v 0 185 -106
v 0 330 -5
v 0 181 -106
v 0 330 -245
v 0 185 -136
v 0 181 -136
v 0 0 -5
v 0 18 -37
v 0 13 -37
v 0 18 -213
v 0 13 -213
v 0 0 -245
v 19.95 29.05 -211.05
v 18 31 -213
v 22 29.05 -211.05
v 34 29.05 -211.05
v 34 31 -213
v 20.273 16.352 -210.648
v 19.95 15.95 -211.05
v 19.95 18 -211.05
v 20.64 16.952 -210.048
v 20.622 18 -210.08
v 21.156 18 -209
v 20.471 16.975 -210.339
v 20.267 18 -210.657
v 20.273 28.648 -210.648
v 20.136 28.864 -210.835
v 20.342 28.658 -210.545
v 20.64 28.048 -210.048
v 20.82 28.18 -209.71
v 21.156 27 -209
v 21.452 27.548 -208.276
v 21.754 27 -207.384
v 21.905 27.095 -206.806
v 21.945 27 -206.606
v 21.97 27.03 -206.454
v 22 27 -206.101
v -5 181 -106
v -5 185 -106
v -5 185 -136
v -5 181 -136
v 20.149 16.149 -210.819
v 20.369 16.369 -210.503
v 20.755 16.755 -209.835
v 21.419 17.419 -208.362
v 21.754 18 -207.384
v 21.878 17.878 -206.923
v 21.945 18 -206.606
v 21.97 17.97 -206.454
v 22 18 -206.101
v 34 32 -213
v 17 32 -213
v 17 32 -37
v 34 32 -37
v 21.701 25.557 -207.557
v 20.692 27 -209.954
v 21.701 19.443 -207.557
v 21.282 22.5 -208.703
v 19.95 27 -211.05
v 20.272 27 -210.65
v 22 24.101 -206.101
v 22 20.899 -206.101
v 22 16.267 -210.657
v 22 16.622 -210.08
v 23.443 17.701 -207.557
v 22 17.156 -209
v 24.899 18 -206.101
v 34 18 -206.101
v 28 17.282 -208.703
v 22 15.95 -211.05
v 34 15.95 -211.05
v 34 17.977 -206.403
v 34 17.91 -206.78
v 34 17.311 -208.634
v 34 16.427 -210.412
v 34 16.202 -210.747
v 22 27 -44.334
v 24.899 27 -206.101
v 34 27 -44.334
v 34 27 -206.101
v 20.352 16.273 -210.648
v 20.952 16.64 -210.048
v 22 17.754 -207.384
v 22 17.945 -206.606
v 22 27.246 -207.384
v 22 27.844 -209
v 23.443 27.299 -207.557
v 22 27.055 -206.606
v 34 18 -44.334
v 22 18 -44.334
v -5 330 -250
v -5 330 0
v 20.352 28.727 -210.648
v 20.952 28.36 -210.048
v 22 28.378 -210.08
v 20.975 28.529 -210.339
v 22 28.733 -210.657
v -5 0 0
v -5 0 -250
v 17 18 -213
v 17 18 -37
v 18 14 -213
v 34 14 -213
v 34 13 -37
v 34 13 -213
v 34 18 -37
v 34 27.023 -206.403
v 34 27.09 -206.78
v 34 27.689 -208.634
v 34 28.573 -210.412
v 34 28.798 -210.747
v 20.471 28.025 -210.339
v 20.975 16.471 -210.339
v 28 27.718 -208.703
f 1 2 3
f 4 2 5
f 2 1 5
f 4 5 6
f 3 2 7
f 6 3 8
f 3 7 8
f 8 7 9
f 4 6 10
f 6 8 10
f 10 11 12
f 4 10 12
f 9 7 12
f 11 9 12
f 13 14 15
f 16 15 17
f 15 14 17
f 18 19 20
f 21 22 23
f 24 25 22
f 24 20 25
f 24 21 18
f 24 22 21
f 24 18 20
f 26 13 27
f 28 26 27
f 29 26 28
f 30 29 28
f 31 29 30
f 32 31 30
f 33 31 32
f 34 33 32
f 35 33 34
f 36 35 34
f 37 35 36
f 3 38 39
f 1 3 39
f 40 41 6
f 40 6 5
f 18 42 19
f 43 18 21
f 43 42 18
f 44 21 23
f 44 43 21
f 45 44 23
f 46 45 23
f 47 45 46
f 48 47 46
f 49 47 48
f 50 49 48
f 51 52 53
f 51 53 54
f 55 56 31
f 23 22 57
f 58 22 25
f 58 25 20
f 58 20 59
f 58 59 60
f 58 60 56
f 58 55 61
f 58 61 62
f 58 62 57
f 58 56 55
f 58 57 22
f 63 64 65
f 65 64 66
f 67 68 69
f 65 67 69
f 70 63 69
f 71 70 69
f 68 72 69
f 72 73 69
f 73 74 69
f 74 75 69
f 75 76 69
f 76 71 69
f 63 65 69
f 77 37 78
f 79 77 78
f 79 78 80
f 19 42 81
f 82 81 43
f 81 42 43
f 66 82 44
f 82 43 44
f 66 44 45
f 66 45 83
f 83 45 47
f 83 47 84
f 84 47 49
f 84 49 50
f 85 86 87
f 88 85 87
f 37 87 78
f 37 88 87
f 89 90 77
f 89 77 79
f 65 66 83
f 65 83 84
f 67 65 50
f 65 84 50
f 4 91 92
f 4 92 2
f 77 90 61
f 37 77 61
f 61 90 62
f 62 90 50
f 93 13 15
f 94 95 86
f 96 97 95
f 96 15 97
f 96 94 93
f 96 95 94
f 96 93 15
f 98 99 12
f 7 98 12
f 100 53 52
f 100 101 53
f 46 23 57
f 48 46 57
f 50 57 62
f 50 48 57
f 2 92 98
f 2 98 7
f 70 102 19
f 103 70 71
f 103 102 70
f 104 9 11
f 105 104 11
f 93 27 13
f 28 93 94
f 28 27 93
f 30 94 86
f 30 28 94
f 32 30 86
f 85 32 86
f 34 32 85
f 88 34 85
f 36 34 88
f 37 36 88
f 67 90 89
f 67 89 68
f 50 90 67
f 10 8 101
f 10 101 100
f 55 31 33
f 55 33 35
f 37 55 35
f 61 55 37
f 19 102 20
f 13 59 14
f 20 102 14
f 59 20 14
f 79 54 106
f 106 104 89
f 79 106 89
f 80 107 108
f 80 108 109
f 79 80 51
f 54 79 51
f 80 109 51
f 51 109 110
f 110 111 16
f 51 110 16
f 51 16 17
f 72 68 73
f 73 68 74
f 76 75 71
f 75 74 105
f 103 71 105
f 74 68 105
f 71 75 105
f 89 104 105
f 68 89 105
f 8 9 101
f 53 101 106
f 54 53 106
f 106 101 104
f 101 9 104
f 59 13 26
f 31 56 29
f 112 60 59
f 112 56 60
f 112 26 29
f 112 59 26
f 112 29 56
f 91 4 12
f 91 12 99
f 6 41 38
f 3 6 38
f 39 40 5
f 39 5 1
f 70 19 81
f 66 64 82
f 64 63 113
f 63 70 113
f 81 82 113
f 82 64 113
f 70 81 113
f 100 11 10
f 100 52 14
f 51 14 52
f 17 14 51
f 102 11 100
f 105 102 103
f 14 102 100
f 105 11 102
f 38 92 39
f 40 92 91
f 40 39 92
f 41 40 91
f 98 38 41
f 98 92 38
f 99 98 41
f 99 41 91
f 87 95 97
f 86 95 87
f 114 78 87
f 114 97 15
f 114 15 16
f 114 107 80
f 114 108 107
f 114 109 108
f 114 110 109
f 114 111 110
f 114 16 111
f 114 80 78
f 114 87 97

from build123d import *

# Parameters (mm, degrees)
CROQUIS1_W              = 5
CROQUIS1_H              = 250
SALIENTE_EXTRUIR1_DEPTH = 330
CORTAR_EXTRUIR1_REACH   = 416.035
CROQUIS3_W              = 176
CROQUIS3_H              = 5
SALIENTE_EXTRUIR2_DEPTH = 34
CROQUIS4_W              = 5
CROQUIS4_H              = 176
SALIENTE_EXTRUIR3_DEPTH = 9
CROQUIS5_W              = 17
CROQUIS5_H              = 176
SALIENTE_EXTRUIR4_DEPTH = 5
REDONDEO1_SIZE          = 4
CROQUIS6_W              = 12
CROQUIS6_H              = 7.334173777
SALIENTE_EXTRUIR5_DEPTH = 9
CORTAR_EXTRUIR2_REACH   = 417.838
CROQUIS7_W              = 30
CROQUIS7_H              = 4


with BuildPart() as part:
    # Croquis1 → Saliente-Extruir1 (new body)
    with BuildSketch(Plane(origin=(0, 0, 0), x_dir=(1, 0, 0), z_dir=(0, 1, 0))):
        with Locations((-2.5, 125)):
            Rectangle(CROQUIS1_W, CROQUIS1_H)
    extrude(amount=SALIENTE_EXTRUIR1_DEPTH)

    # Croquis2 → Cortar-Extruir1 (cut, up to next)
    with BuildSketch(Plane(origin=(0, 330, 0), x_dir=(1, 0, 0), z_dir=(0, 1, 0)), mode=Mode.PRIVATE) as cortar_extruir1_sk1:
        Polygon((0, 250), (0, 245), (-5, 250), align=None)
    cortar_extruir1_tool1 = extrude(cortar_extruir1_sk1.sketch, amount=-CORTAR_EXTRUIR1_REACH, mode=Mode.PRIVATE) & part.part
    # Croquis2 → Cortar-Extruir1 (cut, up to next)
    with BuildSketch(Plane(origin=(0, 330, 0), x_dir=(1, 0, 0), z_dir=(0, 1, 0)), mode=Mode.PRIVATE) as cortar_extruir1_sk2:
        Polygon((-5, 0), (0, 5), (0, 0), align=None)
    cortar_extruir1_tool2 = extrude(cortar_extruir1_sk2.sketch, amount=-CORTAR_EXTRUIR1_REACH, mode=Mode.PRIVATE) & part.part
    add(cortar_extruir1_tool1.solids().sort_by_distance((-1.666667, 330, -248.333333))[0], mode=Mode.SUBTRACT)
    add(cortar_extruir1_tool2.solids().sort_by_distance((-1.666667, 330, -1.666667))[0], mode=Mode.SUBTRACT)

    # Croquis3 → Saliente-Extruir2 (add)
    with BuildSketch(Plane(origin=(0, 0, 0), x_dir=(0, 0, -1), z_dir=(1, 0, 0))):
        with Locations((125, 15.5)):
            Rectangle(CROQUIS3_W, CROQUIS3_H)
    extrude(amount=SALIENTE_EXTRUIR2_DEPTH)

    # Croquis4 → Saliente-Extruir3 (add)
    with BuildSketch(Plane(origin=(0, 18, 0), x_dir=(1, 0, 0), z_dir=(0, 1, 0))):
        with Locations((19.5, 125)):
            Rectangle(CROQUIS4_W, CROQUIS4_H)
    extrude(amount=SALIENTE_EXTRUIR3_DEPTH)

    # Croquis5 → Saliente-Extruir4 (add)
    with BuildSketch(Plane(origin=(0, 27, 0), x_dir=(1, 0, 0), z_dir=(0, 1, 0))):
        with Locations((25.5, 125)):
            Rectangle(CROQUIS5_W, CROQUIS5_H)
    extrude(amount=SALIENTE_EXTRUIR4_DEPTH)

    # Redondeo1
    redondeo1_edges = [part.edges().sort_by_distance(p)[0] for p in [
        (28, 18, -213),
        (22, 22.5, -213),
        (28, 27, -213),
    ]]
    chamfer(redondeo1_edges, length=REDONDEO1_SIZE)

    # Redondeo2
    # a fillet whose section is not a circle: 7 mm, written as the material it takes off along each edge
    with BuildSketch(Plane(origin=(22, 27, -209), x_dir=(0, 0.7071067811865493, -0.7071067811865457), z_dir=(1, 0, 0))) as redondeo2_piece_1_section:
        with BuildLine():
            Bezier((2.899494937, 0), (0, 0), (-2.050252532, 2.050252532), weights=[1, 0.428571429, 1])
            Line((-2.050252532, 2.050252532), (0, 0))
            Line((0, 0), (2.899494937, 0))
        make_face()
    redondeo2_piece_1 = extrude(amount=19.248737342, mode=Mode.PRIVATE)
    redondeo2_piece_1 = split(redondeo2_piece_1, bisect_by=Plane(origin=(22, 27, -209), z_dir=(-0.7071067811865476, 0, 0.7071067811865476)), keep=Keep.TOP, mode=Mode.PRIVATE)
    add(redondeo2_piece_1, mode=Mode.SUBTRACT)
    with BuildSketch(Plane(origin=(14.751262658, 27, -209), x_dir=(0, 0.7071067811865493, -0.7071067811865457), z_dir=(1, 0, 0))) as redondeo2_piece_2_section:
        with BuildLine():
            Bezier((2.899494937, 0), (0, 0), (-2.050252532, 2.050252532), weights=[1, 0.428571429, 1])
            Line((-2.050252532, 2.050252532), (0, 0))
            Line((0, 0), (2.899494937, 0))
        make_face()
    redondeo2_piece_2 = extrude(amount=26.497474683, mode=Mode.PRIVATE)
    redondeo2_piece_2 = split(redondeo2_piece_2, bisect_by=Plane(origin=(18.375631329, 27, -212.624368671), z_dir=(0.7071067811865476, 0, -0.7071067811865476)), keep=Keep.TOP, mode=Mode.PRIVATE)
    redondeo2_piece_2 = split(redondeo2_piece_2, bisect_by=Plane(origin=(22, 27, -209), z_dir=(-1, 0, 0)), keep=Keep.TOP, mode=Mode.PRIVATE)
    add(redondeo2_piece_2, mode=Mode.SUBTRACT)
    with BuildSketch(Plane(origin=(22, 27, -209), x_dir=(0, 0.7071067811865493, -0.7071067811865457), z_dir=(1, 0, 0))) as redondeo2_piece_3_section:
        with BuildLine():
            Bezier((2.899494937, 0), (0, 0), (-2.050252532, 2.050252532), weights=[1, 0.428571429, 1])
            Line((-2.050252532, 2.050252532), (0, 0))
            Line((0, 0), (2.899494937, 0))
        make_face()
    redondeo2_piece_3 = extrude(amount=19.248737342, mode=Mode.PRIVATE)
    redondeo2_piece_3 = split(redondeo2_piece_3, bisect_by=Plane(origin=(22, 27, -209), z_dir=(0.7071067811865476, 0, -0.7071067811865476)), keep=Keep.TOP, mode=Mode.PRIVATE)
    add(redondeo2_piece_3, mode=Mode.SUBTRACT)
    with BuildSketch(Plane(origin=(22, 18, -209), x_dir=(-0.7071067811865493, 0, -0.7071067811865457), z_dir=(0, 1, 0))) as redondeo2_piece_4_section:
        with BuildLine():
            Bezier((2.899494937, 0), (0, 0), (-2.050252532, 2.050252532), weights=[1, 0.428571429, 1])
            Line((-2.050252532, 2.050252532), (0, 0))
            Line((0, 0), (2.899494937, 0))
        make_face()
    redondeo2_piece_4 = extrude(amount=9, mode=Mode.PRIVATE)
    redondeo2_piece_4 = split(redondeo2_piece_4, bisect_by=Plane(origin=(22, 18, -209), z_dir=(0, -0.7071067811865476, 0.7071067811865476)), keep=Keep.TOP, mode=Mode.PRIVATE)
    add(redondeo2_piece_4, mode=Mode.SUBTRACT)
    with BuildSketch(Plane(origin=(22, 10.751262658, -209), x_dir=(-0.7071067811865493, 0, -0.7071067811865457), z_dir=(0, 1, 0))) as redondeo2_piece_5_section:
        with BuildLine():
            Bezier((2.899494937, 0), (0, 0), (-2.050252532, 2.050252532), weights=[1, 0.428571429, 1])
            Line((-2.050252532, 2.050252532), (0, 0))
            Line((0, 0), (2.899494937, 0))
        make_face()
    redondeo2_piece_5 = extrude(amount=16.248737342, mode=Mode.PRIVATE)
    redondeo2_piece_5 = split(redondeo2_piece_5, bisect_by=Plane(origin=(22, 14.375631329, -212.624368671), z_dir=(0, 0.7071067811865476, -0.7071067811865476)), keep=Keep.TOP, mode=Mode.PRIVATE)
    redondeo2_piece_5 = split(redondeo2_piece_5, bisect_by=Plane(origin=(22, 18, -209), z_dir=(0, -1, 0)), keep=Keep.TOP, mode=Mode.PRIVATE)
    add(redondeo2_piece_5, mode=Mode.SUBTRACT)
    with BuildSketch(Plane(origin=(22, 18, -209), x_dir=(-0.7071067811865493, 0, -0.7071067811865457), z_dir=(0, 1, 0))) as redondeo2_piece_6_section:
        with BuildLine():
            Bezier((2.899494937, 0), (0, 0), (-2.050252532, 2.050252532), weights=[1, 0.428571429, 1])
            Line((-2.050252532, 2.050252532), (0, 0))
            Line((0, 0), (2.899494937, 0))
        make_face()
    redondeo2_piece_6 = extrude(amount=9, mode=Mode.PRIVATE)
    redondeo2_piece_6 = split(redondeo2_piece_6, bisect_by=Plane(origin=(22, 18, -209), z_dir=(0, 0.7071067811865476, -0.7071067811865476)), keep=Keep.TOP, mode=Mode.PRIVATE)
    redondeo2_piece_6 = split(redondeo2_piece_6, bisect_by=Plane(origin=(22, 22.5, -204.5), z_dir=(0, -0.7071067811865476, -0.7071067811865476)), keep=Keep.TOP, mode=Mode.PRIVATE)
    add(redondeo2_piece_6, mode=Mode.SUBTRACT)
    with BuildSketch(Plane(origin=(22, 18, -209), x_dir=(-0.7071067811865493, 0, -0.7071067811865457), z_dir=(0, 1, 0))) as redondeo2_piece_7_section:
        with BuildLine():
            Bezier((2.899494937, 0), (0, 0), (-2.050252532, 2.050252532), weights=[1, 0.428571429, 1])
            Line((-2.050252532, 2.050252532), (0, 0))
            Line((0, 0), (2.899494937, 0))
        make_face()
    redondeo2_piece_7 = extrude(amount=9, mode=Mode.PRIVATE)
    redondeo2_piece_7 = split(redondeo2_piece_7, bisect_by=Plane(origin=(22, 22.5, -204.5), z_dir=(0, 0.7071067811865476, 0.7071067811865476)), keep=Keep.TOP, mode=Mode.PRIVATE)
    add(redondeo2_piece_7, mode=Mode.SUBTRACT)
    with BuildSketch(Plane(origin=(22, 18, -209), x_dir=(-0.7071067811865493, 0, -0.7071067811865457), z_dir=(0, 1, 0))) as redondeo2_piece_8_section:
        with BuildLine():
            Bezier((2.899494937, 0), (0, 0), (-2.050252532, 2.050252532), weights=[1, 0.428571429, 1])
            Line((-2.050252532, 2.050252532), (0, 0))
            Line((0, 0), (2.899494937, 0))
        make_face()
    redondeo2_piece_8 = extrude(amount=16.248737342, mode=Mode.PRIVATE)
    redondeo2_piece_8 = split(redondeo2_piece_8, bisect_by=Plane(origin=(22, 22.5, -204.5), z_dir=(0, -0.7071067811865476, -0.7071067811865476)), keep=Keep.TOP, mode=Mode.PRIVATE)
    redondeo2_piece_8 = split(redondeo2_piece_8, bisect_by=Plane(origin=(22, 27, -209), z_dir=(0, 1, 0)), keep=Keep.TOP, mode=Mode.PRIVATE)
    add(redondeo2_piece_8, mode=Mode.SUBTRACT)
    with BuildSketch(Plane(origin=(22, 18, -209), x_dir=(0, -0.7071067811865497, -0.7071067811865454), z_dir=(1, 0, 0))) as redondeo2_piece_9_section:
        with BuildLine():
            Bezier((2.899494937, 0), (0, 0), (-2.050252532, -2.050252532), weights=[1, 0.428571429, 1])
            Line((-2.050252532, -2.050252532), (0, 0))
            Line((0, 0), (2.899494937, 0))
        make_face()
    redondeo2_piece_9 = extrude(amount=19.248737342, mode=Mode.PRIVATE)
    redondeo2_piece_9 = split(redondeo2_piece_9, bisect_by=Plane(origin=(22, 18, -209), z_dir=(-0.7071067811865476, 0, 0.7071067811865476)), keep=Keep.TOP, mode=Mode.PRIVATE)
    add(redondeo2_piece_9, mode=Mode.SUBTRACT)
    with BuildSketch(Plane(origin=(14.751262658, 18, -209), x_dir=(0, -0.7071067811865497, -0.7071067811865454), z_dir=(1, 0, 0))) as redondeo2_piece_10_section:
        with BuildLine():
            Bezier((2.899494937, 0), (0, 0), (-2.050252532, -2.050252532), weights=[1, 0.428571429, 1])
            Line((-2.050252532, -2.050252532), (0, 0))
            Line((0, 0), (2.899494937, 0))
        make_face()
    redondeo2_piece_10 = extrude(amount=26.497474683, mode=Mode.PRIVATE)
    redondeo2_piece_10 = split(redondeo2_piece_10, bisect_by=Plane(origin=(18.375631329, 18, -212.624368671), z_dir=(0.7071067811865476, 0, -0.7071067811865476)), keep=Keep.TOP, mode=Mode.PRIVATE)
    redondeo2_piece_10 = split(redondeo2_piece_10, bisect_by=Plane(origin=(22, 18, -209), z_dir=(-1, 0, 0)), keep=Keep.TOP, mode=Mode.PRIVATE)
    add(redondeo2_piece_10, mode=Mode.SUBTRACT)
    with BuildSketch(Plane(origin=(22, 18, -209), x_dir=(0, -0.7071067811865497, -0.7071067811865454), z_dir=(1, 0, 0))) as redondeo2_piece_11_section:
        with BuildLine():
            Bezier((2.899494937, 0), (0, 0), (-2.050252532, -2.050252532), weights=[1, 0.428571429, 1])
            Line((-2.050252532, -2.050252532), (0, 0))
            Line((0, 0), (2.899494937, 0))
        make_face()
    redondeo2_piece_11 = extrude(amount=19.248737342, mode=Mode.PRIVATE)
    redondeo2_piece_11 = split(redondeo2_piece_11, bisect_by=Plane(origin=(22, 18, -209), z_dir=(0.7071067811865476, 0, -0.7071067811865476)), keep=Keep.TOP, mode=Mode.PRIVATE)
    add(redondeo2_piece_11, mode=Mode.SUBTRACT)
    with BuildSketch(Plane(origin=(22, 18, -209), x_dir=(-0.7071067811865493, 0, -0.7071067811865457), z_dir=(0, 1, 0))) as redondeo2_piece_12a_section:
        with BuildLine():
            Bezier((2.899494937, 0), (0, 0), (-2.050252532, 2.050252532), weights=[1, 0.428571429, 1])
            Line((-2.050252532, 2.050252532), (0, 0))
            Line((0, 0), (2.899494937, 0))
        make_face()
    redondeo2_piece_12a = extrude(amount=16.248737342, mode=Mode.PRIVATE)
    redondeo2_piece_12a = split(redondeo2_piece_12a, bisect_by=Plane(origin=(22, 22.5, -204.5), z_dir=(0, 0.7071067811865476, 0.7071067811865476)), keep=Keep.TOP, mode=Mode.PRIVATE)
    redondeo2_piece_12a = split(redondeo2_piece_12a, bisect_by=Plane(origin=(22, 27, -209), z_dir=(0, 1, 0)), keep=Keep.TOP, mode=Mode.PRIVATE)
    with BuildSketch(Plane(origin=(14.751262658, 27, -209), x_dir=(0, 0.7071067811865493, -0.7071067811865457), z_dir=(1, 0, 0))) as redondeo2_piece_12b_section:
        with BuildLine():
            Bezier((2.899494937, 0), (0, 0), (-2.050252532, 2.050252532), weights=[1, 0.428571429, 1])
            Line((-2.050252532, 2.050252532), (0, 0))
            Line((0, 0), (2.899494937, 0))
        make_face()
    redondeo2_piece_12b = extrude(amount=26.497474683, mode=Mode.PRIVATE)
    redondeo2_piece_12b = split(redondeo2_piece_12b, bisect_by=Plane(origin=(18.375631329, 27, -212.624368671), z_dir=(-0.7071067811865476, 0, 0.7071067811865476)), keep=Keep.TOP, mode=Mode.PRIVATE)
    redondeo2_piece_12b = split(redondeo2_piece_12b, bisect_by=Plane(origin=(22, 27, -209), z_dir=(-1, 0, 0)), keep=Keep.TOP, mode=Mode.PRIVATE)
    redondeo2_piece_12 = redondeo2_piece_12a & redondeo2_piece_12b
    add(redondeo2_piece_12, mode=Mode.SUBTRACT)
    with BuildSketch(Plane(origin=(14.751262658, 18, -209), x_dir=(0, -0.7071067811865497, -0.7071067811865454), z_dir=(1, 0, 0))) as redondeo2_piece_13a_section:
        with BuildLine():
            Bezier((2.899494937, 0), (0, 0), (-2.050252532, -2.050252532), weights=[1, 0.428571429, 1])
            Line((-2.050252532, -2.050252532), (0, 0))
            Line((0, 0), (2.899494937, 0))
        make_face()
    redondeo2_piece_13a = extrude(amount=26.497474683, mode=Mode.PRIVATE)
    redondeo2_piece_13a = split(redondeo2_piece_13a, bisect_by=Plane(origin=(18.375631329, 18, -212.624368671), z_dir=(-0.7071067811865476, 0, 0.7071067811865476)), keep=Keep.TOP, mode=Mode.PRIVATE)
    redondeo2_piece_13a = split(redondeo2_piece_13a, bisect_by=Plane(origin=(22, 18, -209), z_dir=(-1, 0, 0)), keep=Keep.TOP, mode=Mode.PRIVATE)
    redondeo2_piece_13a = split(redondeo2_piece_13a, bisect_by=Plane(origin=(17, 18, -209), z_dir=(1, 0, 0)), keep=Keep.TOP, mode=Mode.PRIVATE)
    with BuildSketch(Plane(origin=(22, 10.751262658, -209), x_dir=(-0.7071067811865493, 0, -0.7071067811865457), z_dir=(0, 1, 0))) as redondeo2_piece_13b_section:
        with BuildLine():
            Bezier((2.899494937, 0), (0, 0), (-2.050252532, 2.050252532), weights=[1, 0.428571429, 1])
            Line((-2.050252532, 2.050252532), (0, 0))
            Line((0, 0), (2.899494937, 0))
        make_face()
    redondeo2_piece_13b = extrude(amount=16.248737342, mode=Mode.PRIVATE)
    redondeo2_piece_13b = split(redondeo2_piece_13b, bisect_by=Plane(origin=(22, 14.375631329, -212.624368671), z_dir=(0, -0.7071067811865476, 0.7071067811865476)), keep=Keep.TOP, mode=Mode.PRIVATE)
    redondeo2_piece_13b = split(redondeo2_piece_13b, bisect_by=Plane(origin=(22, 18, -209), z_dir=(0, -1, 0)), keep=Keep.TOP, mode=Mode.PRIVATE)
    redondeo2_piece_13 = redondeo2_piece_13a & redondeo2_piece_13b
    add(redondeo2_piece_13, mode=Mode.SUBTRACT)

    # Croquis6 → Saliente-Extruir5 (add)
    with BuildSketch(Plane(origin=(0, 18, 0), x_dir=(1, 0, 0), z_dir=(0, 1, 0))):
        with Locations((28, 40.667086889)):
            Rectangle(CROQUIS6_W, CROQUIS6_H)
    extrude(amount=SALIENTE_EXTRUIR5_DEPTH)

    # Croquis7 → Cortar-Extruir2 (cut, up to next)
    with BuildSketch(Plane.ZY.offset(5), mode=Mode.PRIVATE) as cortar_extruir2_sk1:
        with Locations((-121, 183)):
            Rectangle(CROQUIS7_W, CROQUIS7_H)
    cortar_extruir2_tool1 = extrude(cortar_extruir2_sk1.sketch, amount=-CORTAR_EXTRUIR2_REACH, mode=Mode.PRIVATE) & part.part
    add(cortar_extruir2_tool1.solids().sort_by_distance((-5, 183, -121))[0], mode=Mode.SUBTRACT)


solid = part.part
